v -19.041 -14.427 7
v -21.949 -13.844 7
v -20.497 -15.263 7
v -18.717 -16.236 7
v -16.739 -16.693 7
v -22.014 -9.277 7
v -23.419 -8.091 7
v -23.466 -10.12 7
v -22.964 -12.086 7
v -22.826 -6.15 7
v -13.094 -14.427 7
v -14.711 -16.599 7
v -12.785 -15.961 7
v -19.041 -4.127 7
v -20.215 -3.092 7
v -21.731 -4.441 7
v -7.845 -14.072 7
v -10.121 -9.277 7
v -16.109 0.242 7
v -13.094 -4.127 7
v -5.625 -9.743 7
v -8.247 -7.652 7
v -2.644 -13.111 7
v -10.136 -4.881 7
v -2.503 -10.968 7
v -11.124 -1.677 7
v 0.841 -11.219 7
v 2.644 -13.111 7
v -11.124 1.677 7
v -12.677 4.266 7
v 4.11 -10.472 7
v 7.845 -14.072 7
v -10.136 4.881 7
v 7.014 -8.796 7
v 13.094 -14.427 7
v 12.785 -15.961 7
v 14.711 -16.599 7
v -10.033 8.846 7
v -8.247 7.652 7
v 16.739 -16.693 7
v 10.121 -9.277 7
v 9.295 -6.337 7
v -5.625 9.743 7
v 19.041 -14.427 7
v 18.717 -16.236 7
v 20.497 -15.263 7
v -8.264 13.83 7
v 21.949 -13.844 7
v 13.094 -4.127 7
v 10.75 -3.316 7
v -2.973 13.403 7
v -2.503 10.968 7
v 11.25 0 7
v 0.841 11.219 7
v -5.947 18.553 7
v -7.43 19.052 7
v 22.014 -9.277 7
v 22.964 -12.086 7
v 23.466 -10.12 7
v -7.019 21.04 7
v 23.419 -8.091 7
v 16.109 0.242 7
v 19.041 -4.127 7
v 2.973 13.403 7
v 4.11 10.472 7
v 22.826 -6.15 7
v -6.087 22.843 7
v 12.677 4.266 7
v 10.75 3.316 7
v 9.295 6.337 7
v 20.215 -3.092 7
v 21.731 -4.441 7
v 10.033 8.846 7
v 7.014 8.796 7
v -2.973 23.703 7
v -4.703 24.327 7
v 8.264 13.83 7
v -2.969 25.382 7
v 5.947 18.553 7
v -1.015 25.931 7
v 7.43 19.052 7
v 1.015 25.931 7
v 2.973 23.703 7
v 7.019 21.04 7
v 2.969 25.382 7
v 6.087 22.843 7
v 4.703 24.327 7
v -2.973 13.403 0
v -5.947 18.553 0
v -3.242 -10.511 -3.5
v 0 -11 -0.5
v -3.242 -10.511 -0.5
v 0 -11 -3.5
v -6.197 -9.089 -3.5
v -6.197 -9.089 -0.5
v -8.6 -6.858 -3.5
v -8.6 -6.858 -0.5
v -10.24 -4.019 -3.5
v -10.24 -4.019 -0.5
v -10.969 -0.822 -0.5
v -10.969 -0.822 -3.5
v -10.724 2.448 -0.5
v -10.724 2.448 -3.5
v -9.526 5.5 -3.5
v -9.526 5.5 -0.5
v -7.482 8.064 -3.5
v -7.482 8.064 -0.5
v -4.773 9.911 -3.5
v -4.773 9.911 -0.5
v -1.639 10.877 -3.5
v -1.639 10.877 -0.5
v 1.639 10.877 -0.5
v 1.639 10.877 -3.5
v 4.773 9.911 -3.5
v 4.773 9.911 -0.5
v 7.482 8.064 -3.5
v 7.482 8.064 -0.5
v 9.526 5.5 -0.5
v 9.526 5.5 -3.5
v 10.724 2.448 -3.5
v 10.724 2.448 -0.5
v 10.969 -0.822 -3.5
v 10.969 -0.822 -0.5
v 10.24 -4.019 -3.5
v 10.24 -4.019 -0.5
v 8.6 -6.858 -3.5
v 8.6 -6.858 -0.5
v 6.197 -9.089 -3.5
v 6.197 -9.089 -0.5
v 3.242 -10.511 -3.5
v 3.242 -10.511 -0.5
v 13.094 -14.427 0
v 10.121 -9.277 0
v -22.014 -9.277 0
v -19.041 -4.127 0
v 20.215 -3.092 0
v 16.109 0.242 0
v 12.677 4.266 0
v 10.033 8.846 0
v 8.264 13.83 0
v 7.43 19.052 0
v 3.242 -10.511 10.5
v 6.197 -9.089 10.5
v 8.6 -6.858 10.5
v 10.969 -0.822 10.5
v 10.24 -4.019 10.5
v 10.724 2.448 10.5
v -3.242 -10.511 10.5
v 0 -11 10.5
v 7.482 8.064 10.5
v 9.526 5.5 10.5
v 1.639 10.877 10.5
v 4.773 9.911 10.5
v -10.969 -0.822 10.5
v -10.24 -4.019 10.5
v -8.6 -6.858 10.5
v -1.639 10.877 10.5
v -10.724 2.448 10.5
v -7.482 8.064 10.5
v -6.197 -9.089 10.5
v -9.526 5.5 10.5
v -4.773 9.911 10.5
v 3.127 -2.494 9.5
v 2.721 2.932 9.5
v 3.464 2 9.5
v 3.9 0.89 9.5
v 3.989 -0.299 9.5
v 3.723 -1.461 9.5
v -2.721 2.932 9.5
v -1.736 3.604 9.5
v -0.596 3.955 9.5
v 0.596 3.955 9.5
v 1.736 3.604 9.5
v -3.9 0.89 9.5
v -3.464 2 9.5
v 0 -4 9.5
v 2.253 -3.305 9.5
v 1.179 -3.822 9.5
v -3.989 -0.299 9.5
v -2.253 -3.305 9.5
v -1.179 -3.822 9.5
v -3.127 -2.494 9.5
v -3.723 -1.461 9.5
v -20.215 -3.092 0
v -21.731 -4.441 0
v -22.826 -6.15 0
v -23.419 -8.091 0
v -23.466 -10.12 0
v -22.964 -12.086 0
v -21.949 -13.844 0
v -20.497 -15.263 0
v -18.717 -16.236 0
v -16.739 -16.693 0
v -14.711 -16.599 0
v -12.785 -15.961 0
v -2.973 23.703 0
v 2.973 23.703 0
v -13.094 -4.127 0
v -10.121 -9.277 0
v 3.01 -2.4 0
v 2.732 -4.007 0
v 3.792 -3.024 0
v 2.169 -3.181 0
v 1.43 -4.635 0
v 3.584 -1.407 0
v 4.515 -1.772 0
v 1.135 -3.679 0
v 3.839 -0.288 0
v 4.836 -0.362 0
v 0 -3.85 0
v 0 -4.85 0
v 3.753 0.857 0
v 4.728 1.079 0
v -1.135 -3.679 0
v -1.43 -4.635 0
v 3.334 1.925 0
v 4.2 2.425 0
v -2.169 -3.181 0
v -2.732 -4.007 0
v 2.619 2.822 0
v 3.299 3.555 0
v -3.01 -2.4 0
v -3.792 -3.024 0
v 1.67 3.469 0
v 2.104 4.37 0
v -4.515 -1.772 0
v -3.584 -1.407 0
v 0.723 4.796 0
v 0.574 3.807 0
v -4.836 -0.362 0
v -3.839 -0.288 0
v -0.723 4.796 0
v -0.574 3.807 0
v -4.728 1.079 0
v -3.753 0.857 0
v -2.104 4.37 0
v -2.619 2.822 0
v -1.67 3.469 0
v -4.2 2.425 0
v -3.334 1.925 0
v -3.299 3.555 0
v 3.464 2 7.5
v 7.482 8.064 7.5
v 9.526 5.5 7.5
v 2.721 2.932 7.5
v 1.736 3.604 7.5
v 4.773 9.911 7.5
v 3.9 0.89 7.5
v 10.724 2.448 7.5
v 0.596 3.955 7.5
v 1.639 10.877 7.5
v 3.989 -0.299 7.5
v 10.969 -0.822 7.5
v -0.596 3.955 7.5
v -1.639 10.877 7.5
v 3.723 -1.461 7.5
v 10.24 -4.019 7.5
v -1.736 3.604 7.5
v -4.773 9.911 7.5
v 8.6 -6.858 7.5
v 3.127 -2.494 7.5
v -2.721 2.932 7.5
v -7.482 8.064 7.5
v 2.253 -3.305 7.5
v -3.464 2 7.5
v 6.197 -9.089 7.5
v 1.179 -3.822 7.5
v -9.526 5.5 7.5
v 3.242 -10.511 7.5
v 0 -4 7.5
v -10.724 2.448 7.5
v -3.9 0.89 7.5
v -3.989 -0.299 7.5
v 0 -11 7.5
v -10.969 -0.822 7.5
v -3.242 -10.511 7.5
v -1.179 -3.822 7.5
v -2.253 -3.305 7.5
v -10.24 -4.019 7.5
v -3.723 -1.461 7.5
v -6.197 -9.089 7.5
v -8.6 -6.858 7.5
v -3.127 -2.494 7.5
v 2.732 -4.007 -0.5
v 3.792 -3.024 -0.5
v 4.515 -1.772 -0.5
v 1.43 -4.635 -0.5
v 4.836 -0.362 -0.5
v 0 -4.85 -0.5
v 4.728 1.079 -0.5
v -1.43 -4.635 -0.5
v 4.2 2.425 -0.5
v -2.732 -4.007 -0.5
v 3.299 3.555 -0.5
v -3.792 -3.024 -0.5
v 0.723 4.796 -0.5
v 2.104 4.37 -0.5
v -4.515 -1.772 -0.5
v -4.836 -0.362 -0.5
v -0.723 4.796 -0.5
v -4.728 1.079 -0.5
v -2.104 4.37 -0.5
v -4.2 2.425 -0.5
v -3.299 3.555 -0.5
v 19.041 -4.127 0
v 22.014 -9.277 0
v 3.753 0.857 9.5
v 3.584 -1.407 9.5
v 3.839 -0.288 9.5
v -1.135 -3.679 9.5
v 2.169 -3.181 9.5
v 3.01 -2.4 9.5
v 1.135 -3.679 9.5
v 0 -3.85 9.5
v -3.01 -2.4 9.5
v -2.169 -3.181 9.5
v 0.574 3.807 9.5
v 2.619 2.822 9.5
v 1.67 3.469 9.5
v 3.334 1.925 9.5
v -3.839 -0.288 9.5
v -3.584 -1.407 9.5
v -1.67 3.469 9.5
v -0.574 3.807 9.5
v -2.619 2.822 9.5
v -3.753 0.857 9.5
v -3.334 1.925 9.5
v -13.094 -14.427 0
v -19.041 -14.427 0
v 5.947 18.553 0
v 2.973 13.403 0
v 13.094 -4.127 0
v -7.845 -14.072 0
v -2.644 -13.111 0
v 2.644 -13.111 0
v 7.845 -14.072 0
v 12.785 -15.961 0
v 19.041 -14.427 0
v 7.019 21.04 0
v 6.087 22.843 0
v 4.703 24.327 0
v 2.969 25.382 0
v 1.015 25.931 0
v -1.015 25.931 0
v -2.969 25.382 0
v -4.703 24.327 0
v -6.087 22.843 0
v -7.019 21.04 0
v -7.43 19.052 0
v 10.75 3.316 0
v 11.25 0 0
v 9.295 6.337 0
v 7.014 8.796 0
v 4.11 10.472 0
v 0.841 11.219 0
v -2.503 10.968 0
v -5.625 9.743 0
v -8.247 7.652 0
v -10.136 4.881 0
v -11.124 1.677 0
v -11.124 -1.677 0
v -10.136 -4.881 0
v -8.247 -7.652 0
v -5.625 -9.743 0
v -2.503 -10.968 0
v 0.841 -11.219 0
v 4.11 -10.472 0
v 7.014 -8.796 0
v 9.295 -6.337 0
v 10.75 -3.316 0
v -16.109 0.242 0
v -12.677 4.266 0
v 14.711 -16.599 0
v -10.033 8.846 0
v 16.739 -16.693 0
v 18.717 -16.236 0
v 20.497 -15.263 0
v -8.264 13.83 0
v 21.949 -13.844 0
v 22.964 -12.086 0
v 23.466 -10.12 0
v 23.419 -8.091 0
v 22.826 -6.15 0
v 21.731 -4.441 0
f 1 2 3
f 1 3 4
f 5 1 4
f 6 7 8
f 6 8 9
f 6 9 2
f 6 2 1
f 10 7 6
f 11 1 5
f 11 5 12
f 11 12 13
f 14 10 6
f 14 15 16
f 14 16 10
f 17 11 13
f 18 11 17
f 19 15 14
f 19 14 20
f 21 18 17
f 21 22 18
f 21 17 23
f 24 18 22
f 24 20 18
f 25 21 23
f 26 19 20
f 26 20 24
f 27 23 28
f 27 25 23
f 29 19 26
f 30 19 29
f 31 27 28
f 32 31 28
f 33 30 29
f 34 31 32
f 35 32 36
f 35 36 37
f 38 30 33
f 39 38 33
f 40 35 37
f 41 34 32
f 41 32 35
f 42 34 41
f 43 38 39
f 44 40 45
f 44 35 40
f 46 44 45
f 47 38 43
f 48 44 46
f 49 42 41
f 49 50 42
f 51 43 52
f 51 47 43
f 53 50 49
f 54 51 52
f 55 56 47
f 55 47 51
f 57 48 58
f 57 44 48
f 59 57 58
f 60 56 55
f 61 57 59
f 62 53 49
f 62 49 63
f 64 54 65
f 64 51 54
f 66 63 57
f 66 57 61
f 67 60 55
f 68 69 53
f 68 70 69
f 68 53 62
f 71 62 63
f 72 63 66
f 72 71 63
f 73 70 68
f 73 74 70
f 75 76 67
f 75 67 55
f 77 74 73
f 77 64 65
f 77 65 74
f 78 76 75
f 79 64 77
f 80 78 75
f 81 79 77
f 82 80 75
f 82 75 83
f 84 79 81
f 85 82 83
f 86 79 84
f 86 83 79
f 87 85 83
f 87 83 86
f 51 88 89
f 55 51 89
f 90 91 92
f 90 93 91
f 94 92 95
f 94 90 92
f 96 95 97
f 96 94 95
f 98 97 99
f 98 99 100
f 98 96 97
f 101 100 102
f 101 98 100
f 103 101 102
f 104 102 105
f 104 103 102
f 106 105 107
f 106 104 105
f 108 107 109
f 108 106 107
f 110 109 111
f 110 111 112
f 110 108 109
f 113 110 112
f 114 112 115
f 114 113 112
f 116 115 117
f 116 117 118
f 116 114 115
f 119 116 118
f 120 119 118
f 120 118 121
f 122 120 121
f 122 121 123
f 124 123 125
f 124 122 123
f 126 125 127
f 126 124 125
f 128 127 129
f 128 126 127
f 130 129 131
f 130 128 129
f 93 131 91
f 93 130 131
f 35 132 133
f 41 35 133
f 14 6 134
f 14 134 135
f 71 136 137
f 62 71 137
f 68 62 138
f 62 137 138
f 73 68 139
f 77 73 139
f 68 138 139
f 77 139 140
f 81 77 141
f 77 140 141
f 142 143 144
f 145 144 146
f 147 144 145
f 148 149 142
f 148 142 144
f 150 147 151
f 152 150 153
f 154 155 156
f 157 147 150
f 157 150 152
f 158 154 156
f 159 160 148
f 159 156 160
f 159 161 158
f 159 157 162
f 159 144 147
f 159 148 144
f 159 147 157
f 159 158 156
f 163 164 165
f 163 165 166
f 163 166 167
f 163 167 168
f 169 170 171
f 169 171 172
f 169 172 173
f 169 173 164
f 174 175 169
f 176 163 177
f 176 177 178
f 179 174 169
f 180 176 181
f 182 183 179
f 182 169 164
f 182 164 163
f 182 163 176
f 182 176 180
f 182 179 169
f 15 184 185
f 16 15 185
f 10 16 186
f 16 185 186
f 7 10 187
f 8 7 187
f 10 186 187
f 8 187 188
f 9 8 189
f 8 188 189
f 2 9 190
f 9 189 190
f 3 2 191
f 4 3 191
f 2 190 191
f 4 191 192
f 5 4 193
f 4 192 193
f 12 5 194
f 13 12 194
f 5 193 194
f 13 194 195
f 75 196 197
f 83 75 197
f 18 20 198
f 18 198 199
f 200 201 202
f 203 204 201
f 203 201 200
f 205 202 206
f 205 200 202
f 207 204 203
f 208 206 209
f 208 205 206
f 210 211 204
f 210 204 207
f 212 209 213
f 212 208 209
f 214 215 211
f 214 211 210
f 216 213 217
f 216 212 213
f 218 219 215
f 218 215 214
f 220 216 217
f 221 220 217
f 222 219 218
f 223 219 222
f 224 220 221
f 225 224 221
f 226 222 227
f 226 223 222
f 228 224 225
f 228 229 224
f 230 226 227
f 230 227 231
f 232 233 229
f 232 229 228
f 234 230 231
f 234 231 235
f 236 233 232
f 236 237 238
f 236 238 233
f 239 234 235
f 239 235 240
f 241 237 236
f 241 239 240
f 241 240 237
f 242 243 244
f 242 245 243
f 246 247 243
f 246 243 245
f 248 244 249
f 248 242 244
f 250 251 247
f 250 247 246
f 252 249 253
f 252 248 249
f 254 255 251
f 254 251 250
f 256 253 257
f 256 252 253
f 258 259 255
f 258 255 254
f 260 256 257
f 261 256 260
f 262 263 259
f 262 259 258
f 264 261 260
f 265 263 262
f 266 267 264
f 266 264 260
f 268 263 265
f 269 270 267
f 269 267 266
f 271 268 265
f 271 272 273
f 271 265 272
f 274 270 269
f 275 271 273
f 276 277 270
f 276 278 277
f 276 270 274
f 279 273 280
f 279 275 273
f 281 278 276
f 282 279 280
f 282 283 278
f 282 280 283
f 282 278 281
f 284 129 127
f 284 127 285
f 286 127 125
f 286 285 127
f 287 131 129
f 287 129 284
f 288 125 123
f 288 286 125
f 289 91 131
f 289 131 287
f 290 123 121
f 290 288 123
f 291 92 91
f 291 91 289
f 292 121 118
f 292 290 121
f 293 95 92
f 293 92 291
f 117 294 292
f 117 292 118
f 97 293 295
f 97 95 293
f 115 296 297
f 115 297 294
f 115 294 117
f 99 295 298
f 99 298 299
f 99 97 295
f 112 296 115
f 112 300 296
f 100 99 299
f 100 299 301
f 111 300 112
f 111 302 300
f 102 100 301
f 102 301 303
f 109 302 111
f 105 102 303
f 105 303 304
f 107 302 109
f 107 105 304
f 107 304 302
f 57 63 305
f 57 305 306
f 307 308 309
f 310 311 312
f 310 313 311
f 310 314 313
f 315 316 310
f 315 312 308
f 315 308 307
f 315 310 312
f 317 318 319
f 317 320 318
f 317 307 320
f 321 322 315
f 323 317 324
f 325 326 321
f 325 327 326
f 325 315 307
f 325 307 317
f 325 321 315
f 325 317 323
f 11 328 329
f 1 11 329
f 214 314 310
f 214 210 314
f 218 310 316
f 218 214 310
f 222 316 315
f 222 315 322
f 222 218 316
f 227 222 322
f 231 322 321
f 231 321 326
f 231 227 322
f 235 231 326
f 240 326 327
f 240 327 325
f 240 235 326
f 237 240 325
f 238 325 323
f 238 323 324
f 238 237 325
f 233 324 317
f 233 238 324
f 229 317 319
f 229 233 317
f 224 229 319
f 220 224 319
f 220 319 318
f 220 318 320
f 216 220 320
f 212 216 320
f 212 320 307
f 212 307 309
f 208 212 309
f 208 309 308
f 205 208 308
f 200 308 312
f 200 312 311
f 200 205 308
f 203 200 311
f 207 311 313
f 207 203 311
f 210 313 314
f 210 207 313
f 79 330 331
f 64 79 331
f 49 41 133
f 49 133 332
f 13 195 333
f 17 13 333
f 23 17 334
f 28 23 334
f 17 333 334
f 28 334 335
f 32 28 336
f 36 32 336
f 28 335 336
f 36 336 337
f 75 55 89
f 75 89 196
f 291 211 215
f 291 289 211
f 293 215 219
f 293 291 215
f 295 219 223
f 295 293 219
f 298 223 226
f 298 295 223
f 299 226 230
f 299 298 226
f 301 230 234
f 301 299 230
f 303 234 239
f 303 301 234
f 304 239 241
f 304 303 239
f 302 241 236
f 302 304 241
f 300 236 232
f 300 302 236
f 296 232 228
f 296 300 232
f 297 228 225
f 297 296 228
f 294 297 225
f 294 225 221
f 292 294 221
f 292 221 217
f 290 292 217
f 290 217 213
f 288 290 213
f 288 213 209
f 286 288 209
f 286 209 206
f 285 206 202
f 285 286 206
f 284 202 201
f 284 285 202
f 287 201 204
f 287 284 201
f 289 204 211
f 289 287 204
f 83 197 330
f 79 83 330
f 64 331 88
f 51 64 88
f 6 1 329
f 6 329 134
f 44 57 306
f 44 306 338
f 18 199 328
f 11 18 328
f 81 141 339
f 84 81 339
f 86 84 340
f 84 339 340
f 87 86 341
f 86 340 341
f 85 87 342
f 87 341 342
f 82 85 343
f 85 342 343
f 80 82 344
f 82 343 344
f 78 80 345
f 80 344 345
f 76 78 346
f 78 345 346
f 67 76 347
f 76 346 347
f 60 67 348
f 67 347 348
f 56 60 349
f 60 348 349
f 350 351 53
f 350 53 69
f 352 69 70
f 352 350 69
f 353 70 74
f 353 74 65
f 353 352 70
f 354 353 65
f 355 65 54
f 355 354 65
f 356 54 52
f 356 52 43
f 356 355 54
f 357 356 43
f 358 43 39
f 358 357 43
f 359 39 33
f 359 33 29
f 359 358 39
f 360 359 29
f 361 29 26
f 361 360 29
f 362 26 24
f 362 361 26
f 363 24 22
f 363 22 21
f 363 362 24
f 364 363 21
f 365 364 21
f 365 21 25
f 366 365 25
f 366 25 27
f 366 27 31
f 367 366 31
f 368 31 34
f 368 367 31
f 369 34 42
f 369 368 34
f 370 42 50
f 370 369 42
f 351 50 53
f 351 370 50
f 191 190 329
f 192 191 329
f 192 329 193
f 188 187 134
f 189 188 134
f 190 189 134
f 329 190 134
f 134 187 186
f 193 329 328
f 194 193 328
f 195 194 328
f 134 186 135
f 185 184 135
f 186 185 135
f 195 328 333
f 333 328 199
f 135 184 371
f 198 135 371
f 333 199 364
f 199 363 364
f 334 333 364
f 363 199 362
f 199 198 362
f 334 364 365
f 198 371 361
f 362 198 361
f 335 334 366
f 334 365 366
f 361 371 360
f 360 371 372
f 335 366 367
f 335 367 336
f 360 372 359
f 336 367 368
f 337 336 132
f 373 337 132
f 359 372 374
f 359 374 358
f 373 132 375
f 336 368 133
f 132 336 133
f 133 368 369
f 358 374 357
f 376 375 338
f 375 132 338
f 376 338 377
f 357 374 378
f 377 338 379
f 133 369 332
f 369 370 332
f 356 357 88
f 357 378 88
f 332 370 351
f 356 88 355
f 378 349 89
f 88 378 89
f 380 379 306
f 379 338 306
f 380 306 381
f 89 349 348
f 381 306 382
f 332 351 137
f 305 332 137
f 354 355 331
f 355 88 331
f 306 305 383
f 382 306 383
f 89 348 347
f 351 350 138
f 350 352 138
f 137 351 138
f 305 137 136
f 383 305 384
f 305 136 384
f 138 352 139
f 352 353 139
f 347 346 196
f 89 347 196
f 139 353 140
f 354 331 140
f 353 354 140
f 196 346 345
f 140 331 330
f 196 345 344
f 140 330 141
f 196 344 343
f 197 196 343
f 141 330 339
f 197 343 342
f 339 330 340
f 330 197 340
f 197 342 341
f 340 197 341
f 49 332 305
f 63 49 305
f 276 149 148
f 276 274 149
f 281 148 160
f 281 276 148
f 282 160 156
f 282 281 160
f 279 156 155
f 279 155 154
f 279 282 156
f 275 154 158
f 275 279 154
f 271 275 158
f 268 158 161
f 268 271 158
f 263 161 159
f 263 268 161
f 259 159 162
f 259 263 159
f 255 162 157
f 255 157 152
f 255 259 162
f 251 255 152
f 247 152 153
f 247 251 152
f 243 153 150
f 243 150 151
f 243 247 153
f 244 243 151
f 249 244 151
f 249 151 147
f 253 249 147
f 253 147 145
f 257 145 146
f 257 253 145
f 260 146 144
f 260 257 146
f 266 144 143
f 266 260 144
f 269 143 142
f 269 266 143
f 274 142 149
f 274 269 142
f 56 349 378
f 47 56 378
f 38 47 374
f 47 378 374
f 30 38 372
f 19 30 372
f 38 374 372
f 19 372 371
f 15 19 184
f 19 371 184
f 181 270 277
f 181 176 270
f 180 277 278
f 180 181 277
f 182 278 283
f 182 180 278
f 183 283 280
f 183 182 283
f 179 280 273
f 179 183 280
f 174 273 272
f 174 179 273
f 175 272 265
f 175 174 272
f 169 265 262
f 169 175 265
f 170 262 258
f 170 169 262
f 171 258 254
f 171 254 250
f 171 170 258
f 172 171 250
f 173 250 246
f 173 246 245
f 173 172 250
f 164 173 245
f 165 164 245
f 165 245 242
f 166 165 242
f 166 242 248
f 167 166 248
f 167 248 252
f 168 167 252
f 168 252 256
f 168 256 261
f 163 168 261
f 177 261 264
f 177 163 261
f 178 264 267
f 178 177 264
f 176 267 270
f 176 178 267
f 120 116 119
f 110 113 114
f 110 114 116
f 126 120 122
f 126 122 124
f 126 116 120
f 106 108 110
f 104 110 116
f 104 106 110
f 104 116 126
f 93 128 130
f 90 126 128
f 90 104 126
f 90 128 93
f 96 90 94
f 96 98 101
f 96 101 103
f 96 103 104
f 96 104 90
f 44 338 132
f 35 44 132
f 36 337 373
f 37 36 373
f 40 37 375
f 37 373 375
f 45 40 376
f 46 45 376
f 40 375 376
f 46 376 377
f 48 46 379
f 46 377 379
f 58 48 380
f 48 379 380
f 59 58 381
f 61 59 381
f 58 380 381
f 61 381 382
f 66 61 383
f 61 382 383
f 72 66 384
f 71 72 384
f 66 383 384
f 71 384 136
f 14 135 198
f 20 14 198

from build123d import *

# Parameters (mm, degrees)
F0_R     = 11.25
F1_DEPTH = 7


with BuildPart() as f1:
    # F0 (on Top) → F1 (new body)
    with BuildSketch(Plane.XY):
        with BuildLine():
            ThreePointArc((20.214697, -3.091565), (11.250074, 6.495233), (7.429975, 19.052224))
            ThreePointArc((7.429975, 19.052224), (0, 26), (-7.429975, 19.052224))
            ThreePointArc((-7.429975, 19.052224), (-11.250074, 6.495233), (-20.214697, -3.091565))
            ThreePointArc((-20.214697, -3.091565), (-22.51666, -13), (-12.784723, -15.960659))
            ThreePointArc((-12.784723, -15.960659), (0, -12.990466), (12.784723, -15.960659))
            ThreePointArc((12.784723, -15.960659), (22.51666, -13), (20.214697, -3.091565))
        make_face()
        Polygon((-13.094269, -14.426646), (-19.040976, -14.426646), (-22.01433, -9.276646), (-19.040976, -4.126646), (-13.094269, -4.126646), (-10.120915, -9.276646), align=None, mode=Mode.SUBTRACT)
        Polygon((19.040976, -4.126646), (22.01433, -9.276646), (19.040976, -14.426646), (13.094269, -14.426646), (10.120915, -9.276646), (13.094269, -4.126646), align=None, mode=Mode.SUBTRACT)
        Circle(F0_R, mode=Mode.SUBTRACT)
        Polygon((2.973354, 23.703292), (5.946708, 18.553292), (2.973354, 13.403292), (-2.973354, 13.403292), (-5.946708, 18.553292), (-2.973354, 23.703292), align=None, mode=Mode.SUBTRACT)
    extrude(amount=F1_DEPTH)


with BuildPart() as f3:
    # F2 (on Right) → F3 (revolve)
    with BuildSketch(Plane.YZ):
        Polygon((-3.85, 7.5), (-3.85, 7), (-3.85, 0), (-3.95, 0), (-4.85, 0), (-4.85, -0.5), (-11, -0.5), (-11, -3.5), (0, -3.5), (0, 9.5), (-3.85, 9.5), align=None)
    revolve(axis=Axis((0, 0, 3.649642), (0, 0, -1)))


with BuildPart() as f4:
    # F2 (on Right) → F4 (revolve)
    with BuildSketch(Plane.YZ):
        Polygon((-4, 9.5), (-3.85, 9.5), (0, 9.5), (0, 10.5), (-11, 10.5), (-11, 7.5), (-4, 7.5), align=None)
    revolve(axis=Axis((0, 0, 3.649642), (0, 0, -1)))


solid = Compound([f1.part, f3.part, f4.part])
